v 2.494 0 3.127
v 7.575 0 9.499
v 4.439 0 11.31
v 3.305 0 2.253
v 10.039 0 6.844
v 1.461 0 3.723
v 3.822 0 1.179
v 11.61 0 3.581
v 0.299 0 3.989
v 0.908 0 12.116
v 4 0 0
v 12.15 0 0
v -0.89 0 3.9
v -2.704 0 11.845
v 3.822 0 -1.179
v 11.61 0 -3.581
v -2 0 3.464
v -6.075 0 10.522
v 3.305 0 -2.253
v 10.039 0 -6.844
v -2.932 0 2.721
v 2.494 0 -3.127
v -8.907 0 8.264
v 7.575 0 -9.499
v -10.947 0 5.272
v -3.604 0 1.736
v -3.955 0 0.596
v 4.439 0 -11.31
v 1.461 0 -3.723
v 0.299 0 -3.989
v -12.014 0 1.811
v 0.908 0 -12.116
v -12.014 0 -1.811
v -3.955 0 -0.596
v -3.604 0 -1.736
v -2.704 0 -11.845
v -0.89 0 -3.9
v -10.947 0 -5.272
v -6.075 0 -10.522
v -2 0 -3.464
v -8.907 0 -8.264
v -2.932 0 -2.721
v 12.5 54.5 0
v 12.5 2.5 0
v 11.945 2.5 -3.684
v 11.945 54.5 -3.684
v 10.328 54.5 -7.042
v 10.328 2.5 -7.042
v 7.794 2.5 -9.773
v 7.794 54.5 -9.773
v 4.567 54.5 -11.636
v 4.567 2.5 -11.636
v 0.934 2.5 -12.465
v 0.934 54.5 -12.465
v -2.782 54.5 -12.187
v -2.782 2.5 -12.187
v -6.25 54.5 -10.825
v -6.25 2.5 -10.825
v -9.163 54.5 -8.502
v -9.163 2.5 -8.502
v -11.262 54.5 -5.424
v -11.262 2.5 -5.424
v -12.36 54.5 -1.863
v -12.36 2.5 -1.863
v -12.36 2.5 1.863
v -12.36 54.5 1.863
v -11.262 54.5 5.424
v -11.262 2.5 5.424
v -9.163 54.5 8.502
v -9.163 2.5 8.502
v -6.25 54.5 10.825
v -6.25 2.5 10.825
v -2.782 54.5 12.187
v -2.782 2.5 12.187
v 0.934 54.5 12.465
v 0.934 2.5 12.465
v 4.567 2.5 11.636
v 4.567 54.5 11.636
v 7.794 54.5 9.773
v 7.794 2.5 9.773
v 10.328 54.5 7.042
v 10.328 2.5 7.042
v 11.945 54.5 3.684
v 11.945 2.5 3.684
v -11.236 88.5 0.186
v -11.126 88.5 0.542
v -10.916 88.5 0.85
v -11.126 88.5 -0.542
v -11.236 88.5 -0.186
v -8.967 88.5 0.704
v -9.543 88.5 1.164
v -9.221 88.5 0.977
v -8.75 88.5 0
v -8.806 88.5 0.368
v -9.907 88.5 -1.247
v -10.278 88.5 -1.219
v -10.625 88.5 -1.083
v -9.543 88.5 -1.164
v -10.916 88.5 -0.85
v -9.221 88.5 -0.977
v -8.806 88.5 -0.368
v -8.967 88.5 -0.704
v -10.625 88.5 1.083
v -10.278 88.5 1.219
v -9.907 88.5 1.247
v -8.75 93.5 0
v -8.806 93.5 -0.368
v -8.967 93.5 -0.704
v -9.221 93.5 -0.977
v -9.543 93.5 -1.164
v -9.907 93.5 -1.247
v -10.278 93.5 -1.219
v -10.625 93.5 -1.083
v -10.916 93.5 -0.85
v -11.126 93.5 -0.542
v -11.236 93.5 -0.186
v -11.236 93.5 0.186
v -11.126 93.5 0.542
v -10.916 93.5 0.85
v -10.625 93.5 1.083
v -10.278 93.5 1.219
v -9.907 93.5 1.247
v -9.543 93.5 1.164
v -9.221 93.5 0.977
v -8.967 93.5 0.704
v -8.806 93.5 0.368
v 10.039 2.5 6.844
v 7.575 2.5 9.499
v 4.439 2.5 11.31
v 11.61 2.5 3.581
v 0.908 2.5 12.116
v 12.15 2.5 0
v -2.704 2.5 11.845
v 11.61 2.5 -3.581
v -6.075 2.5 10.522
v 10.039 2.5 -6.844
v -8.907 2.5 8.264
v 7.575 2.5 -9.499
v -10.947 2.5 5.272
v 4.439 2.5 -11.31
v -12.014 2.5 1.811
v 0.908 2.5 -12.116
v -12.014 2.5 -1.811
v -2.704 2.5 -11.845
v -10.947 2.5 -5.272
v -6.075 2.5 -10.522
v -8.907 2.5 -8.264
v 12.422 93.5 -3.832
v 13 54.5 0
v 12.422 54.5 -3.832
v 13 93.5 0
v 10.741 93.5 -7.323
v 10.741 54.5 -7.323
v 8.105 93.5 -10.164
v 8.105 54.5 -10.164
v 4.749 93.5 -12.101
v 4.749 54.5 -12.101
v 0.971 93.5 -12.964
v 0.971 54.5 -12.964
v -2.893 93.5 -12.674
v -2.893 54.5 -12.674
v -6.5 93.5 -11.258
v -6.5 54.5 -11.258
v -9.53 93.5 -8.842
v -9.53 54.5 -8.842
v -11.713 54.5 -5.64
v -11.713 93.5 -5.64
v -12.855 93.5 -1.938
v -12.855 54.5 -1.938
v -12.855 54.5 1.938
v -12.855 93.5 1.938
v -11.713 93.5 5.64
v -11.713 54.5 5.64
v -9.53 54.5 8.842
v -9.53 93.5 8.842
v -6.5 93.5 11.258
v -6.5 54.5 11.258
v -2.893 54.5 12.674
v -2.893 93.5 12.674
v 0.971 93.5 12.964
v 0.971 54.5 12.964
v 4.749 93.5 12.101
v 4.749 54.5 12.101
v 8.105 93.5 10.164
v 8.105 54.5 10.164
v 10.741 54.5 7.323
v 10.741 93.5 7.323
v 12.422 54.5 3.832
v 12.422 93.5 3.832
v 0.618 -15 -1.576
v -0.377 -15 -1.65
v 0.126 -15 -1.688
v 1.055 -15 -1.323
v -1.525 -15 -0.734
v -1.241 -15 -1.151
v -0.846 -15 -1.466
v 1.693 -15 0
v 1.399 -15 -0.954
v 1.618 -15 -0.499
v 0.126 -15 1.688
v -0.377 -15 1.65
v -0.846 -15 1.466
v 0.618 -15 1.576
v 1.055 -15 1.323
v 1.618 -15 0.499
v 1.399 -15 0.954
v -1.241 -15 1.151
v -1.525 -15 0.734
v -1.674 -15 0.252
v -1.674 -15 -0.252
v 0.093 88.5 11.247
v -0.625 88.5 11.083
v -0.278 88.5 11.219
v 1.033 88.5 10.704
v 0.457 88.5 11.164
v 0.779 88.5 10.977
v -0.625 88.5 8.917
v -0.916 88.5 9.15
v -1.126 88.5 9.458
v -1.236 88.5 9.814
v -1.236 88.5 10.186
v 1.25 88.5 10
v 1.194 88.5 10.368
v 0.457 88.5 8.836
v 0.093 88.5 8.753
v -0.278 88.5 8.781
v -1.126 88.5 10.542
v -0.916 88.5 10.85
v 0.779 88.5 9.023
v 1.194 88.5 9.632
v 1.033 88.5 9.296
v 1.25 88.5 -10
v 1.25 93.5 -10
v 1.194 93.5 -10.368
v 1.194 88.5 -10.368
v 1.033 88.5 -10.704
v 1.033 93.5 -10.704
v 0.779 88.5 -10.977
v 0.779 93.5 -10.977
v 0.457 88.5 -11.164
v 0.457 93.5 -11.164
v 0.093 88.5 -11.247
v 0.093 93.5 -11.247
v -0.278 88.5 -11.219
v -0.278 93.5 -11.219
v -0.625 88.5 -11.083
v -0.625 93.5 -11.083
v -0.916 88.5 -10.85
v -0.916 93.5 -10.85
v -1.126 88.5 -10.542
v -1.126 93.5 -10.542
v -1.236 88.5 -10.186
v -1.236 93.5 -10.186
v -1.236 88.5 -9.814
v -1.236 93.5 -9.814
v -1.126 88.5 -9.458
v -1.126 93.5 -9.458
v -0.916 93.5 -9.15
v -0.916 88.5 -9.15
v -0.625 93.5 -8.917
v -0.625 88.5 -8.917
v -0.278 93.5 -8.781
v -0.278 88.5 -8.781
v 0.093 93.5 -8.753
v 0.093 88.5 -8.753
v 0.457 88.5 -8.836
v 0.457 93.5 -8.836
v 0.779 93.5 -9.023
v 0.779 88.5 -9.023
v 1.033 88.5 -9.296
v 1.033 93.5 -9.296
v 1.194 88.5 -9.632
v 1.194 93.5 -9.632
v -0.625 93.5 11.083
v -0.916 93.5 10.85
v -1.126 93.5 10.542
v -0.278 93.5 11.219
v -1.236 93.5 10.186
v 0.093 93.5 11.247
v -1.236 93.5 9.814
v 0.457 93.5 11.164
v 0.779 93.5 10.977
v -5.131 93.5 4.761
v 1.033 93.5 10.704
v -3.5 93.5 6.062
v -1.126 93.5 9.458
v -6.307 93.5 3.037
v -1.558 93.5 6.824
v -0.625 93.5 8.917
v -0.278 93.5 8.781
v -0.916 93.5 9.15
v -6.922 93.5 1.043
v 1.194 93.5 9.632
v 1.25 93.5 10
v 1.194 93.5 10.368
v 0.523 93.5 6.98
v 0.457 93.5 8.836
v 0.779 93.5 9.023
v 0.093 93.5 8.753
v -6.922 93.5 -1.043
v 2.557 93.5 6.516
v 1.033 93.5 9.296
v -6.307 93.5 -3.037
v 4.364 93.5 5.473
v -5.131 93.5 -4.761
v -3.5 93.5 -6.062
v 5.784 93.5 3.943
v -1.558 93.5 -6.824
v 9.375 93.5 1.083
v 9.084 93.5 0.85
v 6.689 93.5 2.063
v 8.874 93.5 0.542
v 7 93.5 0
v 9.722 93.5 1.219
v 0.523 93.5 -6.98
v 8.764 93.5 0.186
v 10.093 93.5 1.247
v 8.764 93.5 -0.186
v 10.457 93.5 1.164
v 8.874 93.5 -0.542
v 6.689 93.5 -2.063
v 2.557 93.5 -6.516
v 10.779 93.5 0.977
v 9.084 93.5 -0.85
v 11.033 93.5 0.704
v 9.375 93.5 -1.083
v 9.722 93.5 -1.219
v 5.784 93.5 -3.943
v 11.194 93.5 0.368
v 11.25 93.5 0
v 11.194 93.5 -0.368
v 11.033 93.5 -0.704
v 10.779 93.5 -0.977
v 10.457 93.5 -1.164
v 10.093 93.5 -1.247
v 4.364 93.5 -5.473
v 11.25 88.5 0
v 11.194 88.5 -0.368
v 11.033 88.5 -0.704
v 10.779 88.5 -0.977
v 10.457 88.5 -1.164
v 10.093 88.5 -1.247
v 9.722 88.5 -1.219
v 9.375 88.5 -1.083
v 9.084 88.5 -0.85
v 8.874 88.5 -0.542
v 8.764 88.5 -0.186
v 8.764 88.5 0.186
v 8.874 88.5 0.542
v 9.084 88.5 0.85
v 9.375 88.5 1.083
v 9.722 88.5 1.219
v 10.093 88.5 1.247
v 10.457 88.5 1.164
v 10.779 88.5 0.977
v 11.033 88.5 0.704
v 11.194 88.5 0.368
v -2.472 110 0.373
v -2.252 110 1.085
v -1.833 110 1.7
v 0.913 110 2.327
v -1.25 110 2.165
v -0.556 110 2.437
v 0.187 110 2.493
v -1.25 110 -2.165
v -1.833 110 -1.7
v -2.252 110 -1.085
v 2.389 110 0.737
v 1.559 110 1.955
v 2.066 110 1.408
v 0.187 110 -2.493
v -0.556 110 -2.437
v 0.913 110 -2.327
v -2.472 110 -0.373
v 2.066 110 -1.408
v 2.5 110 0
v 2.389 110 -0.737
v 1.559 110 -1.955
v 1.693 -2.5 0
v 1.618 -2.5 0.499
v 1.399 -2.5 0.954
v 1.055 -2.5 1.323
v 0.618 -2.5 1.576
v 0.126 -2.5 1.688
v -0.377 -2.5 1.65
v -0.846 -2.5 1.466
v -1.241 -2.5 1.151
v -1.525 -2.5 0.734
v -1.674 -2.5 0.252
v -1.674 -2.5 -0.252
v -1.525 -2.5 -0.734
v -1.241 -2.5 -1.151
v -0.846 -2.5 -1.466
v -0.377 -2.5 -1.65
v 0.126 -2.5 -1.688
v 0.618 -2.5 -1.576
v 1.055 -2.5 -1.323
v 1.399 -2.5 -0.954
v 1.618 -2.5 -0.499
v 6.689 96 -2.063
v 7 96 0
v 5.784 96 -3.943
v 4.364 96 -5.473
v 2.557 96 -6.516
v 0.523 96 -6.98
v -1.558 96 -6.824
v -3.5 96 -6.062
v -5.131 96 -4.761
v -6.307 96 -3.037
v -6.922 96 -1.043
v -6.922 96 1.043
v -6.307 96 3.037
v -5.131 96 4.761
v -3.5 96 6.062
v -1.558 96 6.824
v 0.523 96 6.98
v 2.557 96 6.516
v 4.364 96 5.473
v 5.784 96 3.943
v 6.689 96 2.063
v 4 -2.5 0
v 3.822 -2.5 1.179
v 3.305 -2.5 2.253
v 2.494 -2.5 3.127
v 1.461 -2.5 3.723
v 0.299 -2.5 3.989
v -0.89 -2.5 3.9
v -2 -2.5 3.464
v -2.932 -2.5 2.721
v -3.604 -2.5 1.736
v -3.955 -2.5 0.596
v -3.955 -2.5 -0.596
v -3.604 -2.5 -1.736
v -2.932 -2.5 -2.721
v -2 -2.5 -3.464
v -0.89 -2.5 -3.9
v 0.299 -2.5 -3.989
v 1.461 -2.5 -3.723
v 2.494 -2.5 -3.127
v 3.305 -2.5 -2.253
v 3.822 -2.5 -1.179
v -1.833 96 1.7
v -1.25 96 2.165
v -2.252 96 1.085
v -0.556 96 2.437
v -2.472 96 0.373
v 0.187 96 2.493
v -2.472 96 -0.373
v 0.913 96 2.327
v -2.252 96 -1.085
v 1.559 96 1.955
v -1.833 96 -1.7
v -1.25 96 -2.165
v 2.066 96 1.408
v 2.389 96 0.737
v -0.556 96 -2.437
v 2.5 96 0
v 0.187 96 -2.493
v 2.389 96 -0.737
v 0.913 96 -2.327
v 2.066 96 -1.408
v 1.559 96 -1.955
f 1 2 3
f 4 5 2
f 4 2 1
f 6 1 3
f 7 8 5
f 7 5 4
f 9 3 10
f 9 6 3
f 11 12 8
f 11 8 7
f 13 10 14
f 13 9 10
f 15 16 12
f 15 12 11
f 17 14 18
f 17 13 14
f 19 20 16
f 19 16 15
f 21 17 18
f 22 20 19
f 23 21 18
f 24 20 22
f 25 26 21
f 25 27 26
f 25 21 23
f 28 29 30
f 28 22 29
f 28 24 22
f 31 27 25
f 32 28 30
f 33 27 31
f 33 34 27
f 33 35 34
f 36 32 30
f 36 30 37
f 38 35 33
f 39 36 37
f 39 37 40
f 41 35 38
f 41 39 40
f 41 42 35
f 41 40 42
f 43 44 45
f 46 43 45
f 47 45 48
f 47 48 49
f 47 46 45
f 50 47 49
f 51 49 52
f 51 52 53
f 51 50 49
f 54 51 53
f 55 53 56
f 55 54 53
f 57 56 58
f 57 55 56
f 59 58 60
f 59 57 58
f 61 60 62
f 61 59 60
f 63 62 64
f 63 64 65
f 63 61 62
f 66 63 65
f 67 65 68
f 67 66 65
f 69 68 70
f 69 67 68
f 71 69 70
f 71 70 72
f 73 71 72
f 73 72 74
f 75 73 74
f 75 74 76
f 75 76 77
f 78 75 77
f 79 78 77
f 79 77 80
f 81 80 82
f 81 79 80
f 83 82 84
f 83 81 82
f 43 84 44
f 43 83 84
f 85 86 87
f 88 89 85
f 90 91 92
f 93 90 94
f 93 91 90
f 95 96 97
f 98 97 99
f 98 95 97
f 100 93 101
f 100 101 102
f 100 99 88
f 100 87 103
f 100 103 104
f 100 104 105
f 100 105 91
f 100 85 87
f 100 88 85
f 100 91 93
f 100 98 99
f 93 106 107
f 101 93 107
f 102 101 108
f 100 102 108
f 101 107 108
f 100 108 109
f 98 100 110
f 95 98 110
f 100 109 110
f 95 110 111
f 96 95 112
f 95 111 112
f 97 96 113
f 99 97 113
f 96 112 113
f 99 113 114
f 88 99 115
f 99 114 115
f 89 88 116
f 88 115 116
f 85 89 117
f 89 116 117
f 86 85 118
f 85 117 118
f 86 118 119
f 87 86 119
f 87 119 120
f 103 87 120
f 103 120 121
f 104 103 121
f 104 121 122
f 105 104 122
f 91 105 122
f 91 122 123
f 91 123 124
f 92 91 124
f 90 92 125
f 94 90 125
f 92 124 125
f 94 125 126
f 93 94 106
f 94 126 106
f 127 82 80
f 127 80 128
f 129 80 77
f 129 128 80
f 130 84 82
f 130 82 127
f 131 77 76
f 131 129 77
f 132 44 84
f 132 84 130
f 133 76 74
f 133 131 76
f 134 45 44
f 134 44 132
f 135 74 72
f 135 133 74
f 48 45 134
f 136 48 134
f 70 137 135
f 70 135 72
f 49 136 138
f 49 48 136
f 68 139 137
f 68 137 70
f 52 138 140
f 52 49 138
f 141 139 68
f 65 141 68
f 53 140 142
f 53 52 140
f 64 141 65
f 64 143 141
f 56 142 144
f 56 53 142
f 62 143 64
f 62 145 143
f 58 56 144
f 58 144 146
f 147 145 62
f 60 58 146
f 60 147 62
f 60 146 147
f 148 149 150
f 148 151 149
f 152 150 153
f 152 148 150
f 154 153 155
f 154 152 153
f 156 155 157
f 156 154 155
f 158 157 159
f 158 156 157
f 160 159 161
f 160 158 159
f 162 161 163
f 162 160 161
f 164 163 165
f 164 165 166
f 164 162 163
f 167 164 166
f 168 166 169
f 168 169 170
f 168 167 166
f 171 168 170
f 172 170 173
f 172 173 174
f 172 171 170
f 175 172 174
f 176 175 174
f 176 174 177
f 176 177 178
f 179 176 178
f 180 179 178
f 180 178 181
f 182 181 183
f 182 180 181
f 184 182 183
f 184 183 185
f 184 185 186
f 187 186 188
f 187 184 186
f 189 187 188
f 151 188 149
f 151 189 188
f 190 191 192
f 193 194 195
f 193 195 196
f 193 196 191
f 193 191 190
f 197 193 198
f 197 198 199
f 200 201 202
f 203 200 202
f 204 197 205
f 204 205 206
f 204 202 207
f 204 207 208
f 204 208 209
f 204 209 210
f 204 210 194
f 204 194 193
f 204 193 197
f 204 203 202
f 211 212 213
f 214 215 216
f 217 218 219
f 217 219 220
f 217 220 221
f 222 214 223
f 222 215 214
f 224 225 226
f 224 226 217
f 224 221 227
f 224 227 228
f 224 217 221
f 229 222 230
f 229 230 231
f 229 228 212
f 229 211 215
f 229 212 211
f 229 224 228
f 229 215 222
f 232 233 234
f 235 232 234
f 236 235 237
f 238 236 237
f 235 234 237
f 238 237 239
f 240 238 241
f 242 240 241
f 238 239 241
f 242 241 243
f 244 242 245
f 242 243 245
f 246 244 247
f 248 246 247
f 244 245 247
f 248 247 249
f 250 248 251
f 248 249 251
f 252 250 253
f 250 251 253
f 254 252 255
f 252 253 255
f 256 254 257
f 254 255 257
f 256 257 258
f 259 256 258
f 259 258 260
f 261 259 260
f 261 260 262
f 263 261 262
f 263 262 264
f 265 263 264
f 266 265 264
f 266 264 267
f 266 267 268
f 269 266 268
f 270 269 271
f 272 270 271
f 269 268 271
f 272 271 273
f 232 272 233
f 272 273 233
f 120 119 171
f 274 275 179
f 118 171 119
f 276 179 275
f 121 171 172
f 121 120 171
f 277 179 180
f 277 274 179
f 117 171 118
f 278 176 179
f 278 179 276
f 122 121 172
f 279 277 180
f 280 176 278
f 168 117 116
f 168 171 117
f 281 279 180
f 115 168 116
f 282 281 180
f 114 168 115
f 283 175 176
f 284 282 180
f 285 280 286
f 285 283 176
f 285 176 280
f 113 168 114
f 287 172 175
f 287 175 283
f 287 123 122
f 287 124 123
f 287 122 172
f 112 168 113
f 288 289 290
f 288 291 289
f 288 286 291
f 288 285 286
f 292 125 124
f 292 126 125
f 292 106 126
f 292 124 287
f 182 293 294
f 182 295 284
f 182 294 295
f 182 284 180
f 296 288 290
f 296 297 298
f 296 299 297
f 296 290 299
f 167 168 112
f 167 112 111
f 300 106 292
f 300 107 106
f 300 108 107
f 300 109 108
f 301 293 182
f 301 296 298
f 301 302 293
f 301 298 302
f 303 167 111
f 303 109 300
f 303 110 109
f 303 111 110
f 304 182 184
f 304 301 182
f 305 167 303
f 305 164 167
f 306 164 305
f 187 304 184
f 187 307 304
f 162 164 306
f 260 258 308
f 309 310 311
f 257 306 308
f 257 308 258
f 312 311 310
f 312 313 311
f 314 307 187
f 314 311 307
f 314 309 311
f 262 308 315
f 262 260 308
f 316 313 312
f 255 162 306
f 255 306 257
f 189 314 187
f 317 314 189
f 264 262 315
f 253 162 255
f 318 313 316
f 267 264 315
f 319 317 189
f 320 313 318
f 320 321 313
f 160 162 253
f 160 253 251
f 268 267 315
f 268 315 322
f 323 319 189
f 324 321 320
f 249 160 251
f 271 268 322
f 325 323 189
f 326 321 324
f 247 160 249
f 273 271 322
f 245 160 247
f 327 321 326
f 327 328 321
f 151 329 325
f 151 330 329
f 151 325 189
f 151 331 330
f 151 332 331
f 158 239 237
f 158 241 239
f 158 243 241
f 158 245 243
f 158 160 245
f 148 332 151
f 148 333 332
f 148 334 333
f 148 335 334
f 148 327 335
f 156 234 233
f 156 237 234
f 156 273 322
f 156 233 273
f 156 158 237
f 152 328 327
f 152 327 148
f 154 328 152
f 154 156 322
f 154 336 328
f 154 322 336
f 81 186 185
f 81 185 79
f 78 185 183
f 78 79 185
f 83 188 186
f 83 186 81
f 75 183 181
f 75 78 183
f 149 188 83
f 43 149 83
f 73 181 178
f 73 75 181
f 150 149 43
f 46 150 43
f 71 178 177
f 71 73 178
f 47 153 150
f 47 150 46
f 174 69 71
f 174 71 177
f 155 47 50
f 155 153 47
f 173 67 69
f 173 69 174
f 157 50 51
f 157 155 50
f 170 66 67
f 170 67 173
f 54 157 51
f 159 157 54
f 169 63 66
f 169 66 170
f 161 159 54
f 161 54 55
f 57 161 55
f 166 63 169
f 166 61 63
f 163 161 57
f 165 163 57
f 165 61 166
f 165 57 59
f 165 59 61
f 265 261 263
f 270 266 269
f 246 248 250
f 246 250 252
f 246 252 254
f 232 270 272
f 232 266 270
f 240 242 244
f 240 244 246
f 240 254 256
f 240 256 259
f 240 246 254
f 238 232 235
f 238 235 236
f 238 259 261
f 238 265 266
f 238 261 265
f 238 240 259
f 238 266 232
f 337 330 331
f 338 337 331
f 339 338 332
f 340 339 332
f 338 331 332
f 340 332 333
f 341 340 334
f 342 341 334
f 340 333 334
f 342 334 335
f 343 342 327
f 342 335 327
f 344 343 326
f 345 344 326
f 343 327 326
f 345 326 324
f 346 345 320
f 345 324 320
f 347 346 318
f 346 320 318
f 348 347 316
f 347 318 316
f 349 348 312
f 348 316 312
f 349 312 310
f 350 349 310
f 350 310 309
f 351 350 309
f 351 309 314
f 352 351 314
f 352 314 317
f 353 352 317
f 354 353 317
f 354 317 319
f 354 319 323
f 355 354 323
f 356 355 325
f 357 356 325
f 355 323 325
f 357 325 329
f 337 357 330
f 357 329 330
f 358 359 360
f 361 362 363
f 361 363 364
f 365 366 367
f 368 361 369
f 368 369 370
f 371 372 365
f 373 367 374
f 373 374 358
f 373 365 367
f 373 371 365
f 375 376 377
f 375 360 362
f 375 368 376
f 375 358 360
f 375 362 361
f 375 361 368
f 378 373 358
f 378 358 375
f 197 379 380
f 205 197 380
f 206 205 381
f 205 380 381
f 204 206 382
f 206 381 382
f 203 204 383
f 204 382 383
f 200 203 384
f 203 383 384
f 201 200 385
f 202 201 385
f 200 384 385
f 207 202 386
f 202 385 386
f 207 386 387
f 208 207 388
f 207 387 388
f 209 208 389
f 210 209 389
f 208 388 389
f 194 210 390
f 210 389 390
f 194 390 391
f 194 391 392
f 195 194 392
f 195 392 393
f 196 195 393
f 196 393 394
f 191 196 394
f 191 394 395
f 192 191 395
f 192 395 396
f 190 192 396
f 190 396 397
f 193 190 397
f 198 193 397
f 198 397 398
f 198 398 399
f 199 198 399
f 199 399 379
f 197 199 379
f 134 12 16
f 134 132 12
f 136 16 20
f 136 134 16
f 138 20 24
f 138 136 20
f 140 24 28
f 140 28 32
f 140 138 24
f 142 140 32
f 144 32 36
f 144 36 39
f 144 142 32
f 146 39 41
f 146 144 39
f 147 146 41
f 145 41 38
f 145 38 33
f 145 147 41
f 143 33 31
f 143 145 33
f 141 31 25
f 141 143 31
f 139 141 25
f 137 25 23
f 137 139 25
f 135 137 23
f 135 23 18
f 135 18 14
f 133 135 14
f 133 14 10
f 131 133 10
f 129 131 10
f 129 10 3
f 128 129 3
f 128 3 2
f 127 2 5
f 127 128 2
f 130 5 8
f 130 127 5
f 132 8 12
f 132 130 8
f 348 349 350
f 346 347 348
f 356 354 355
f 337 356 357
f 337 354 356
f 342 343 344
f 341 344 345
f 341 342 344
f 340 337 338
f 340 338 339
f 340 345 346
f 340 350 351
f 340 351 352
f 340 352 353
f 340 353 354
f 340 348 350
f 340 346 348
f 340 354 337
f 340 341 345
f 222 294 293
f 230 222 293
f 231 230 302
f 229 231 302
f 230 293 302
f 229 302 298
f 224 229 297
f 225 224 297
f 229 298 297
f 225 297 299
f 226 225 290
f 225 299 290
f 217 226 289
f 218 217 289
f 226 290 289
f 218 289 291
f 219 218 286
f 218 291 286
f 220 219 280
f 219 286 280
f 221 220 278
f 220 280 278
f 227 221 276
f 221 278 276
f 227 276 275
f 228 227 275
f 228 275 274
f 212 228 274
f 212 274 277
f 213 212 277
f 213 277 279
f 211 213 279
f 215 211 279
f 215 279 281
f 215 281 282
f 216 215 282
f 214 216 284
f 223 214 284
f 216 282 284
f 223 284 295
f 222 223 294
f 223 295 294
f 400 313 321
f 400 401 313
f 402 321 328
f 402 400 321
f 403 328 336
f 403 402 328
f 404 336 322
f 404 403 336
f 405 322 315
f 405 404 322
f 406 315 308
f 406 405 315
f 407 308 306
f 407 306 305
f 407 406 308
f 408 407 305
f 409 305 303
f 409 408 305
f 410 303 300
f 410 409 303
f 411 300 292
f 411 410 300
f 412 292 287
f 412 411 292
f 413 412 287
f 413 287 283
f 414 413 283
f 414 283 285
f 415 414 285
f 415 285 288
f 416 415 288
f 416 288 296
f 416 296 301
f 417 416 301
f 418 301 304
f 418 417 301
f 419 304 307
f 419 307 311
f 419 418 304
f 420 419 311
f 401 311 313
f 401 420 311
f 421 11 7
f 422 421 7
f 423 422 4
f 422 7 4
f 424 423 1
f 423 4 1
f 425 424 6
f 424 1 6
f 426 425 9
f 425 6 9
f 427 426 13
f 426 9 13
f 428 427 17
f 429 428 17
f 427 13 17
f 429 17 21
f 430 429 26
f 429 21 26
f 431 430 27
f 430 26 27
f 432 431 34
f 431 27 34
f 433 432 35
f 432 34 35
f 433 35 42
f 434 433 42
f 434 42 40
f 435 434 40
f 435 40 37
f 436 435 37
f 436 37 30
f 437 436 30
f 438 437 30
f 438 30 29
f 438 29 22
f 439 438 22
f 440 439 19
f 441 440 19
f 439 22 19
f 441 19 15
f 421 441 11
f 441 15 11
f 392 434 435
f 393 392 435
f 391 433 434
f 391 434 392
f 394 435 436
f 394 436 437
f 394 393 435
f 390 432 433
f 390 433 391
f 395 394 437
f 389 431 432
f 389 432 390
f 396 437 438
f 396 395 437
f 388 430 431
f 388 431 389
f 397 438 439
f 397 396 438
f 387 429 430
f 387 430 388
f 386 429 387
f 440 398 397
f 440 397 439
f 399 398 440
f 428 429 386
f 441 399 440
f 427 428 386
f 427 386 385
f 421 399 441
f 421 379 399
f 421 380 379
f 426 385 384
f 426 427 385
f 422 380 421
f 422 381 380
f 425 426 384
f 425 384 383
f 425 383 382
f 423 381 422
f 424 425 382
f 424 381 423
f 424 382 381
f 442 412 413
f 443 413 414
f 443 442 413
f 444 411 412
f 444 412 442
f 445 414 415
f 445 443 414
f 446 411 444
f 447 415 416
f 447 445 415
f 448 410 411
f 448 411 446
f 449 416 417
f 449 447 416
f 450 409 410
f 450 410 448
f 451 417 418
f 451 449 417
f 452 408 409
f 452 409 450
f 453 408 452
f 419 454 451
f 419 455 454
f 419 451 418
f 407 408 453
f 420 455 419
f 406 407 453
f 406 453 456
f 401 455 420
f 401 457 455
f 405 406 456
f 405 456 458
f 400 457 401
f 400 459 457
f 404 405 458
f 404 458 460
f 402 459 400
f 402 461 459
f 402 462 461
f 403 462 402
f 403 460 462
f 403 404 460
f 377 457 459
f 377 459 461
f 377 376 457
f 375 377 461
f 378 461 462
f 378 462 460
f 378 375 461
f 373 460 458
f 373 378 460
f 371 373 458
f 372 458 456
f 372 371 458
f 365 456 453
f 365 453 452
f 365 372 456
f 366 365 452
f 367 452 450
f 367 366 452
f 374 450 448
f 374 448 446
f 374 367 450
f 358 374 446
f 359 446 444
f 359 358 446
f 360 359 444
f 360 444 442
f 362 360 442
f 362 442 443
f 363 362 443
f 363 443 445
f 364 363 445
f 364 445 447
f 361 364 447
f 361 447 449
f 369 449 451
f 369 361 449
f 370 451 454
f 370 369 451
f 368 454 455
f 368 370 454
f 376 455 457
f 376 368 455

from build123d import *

# Parameters (mm, degrees)
ESQUISSE2_R             = 1.692758077
BOSS_EXTRU_1_DEPTH      = 15
ESQUISSE3_R             = 4
BOSS_EXTRU_2_DEPTH      = 2.5
ESQUISSE4_R             = 1.25
ENL_V_MAT_EXTRU_1_DEPTH = 5


with BuildPart() as part:
    # Esquisse1 → Révolution1 (revolve)
    with BuildSketch(Plane.XY):
        Polygon((0, 0), (12.15, 0), (12.15, 2.5), (12.5, 2.5), (12.5, 54.5), (13, 54.5), (13, 93.5), (7, 93.5), (7, 96), (2.5, 96), (2.5, 110), (0, 110), align=None)
    revolve(axis=Axis((0, 0, 0), (0, 1, 0)))

    # Esquisse2 → Boss.-Extru.1 (add)
    with BuildSketch(Plane.XZ):
        Circle(ESQUISSE2_R)
    extrude(amount=BOSS_EXTRU_1_DEPTH)

    # Esquisse3 → Boss.-Extru.2 (add)
    with BuildSketch(Plane.XZ):
        Circle(ESQUISSE3_R)
    extrude(amount=BOSS_EXTRU_2_DEPTH)

    # Esquisse4 → Enlèv. mat.-Extru.1 (cut)
    with BuildSketch(Plane(origin=(0, 93.5, 0), x_dir=(1, 0, 0), z_dir=(0, 1, 0))):
        with Locations((0, 10)):
            Circle(ESQUISSE4_R)
        with Locations((10, 0)):
            Circle(ESQUISSE4_R)
        with Locations((0, -10)):
            Circle(ESQUISSE4_R)
        with Locations((-10, 0)):
            Circle(ESQUISSE4_R)
    extrude(amount=-ENL_V_MAT_EXTRU_1_DEPTH, mode=Mode.SUBTRACT)


solid = part.part
